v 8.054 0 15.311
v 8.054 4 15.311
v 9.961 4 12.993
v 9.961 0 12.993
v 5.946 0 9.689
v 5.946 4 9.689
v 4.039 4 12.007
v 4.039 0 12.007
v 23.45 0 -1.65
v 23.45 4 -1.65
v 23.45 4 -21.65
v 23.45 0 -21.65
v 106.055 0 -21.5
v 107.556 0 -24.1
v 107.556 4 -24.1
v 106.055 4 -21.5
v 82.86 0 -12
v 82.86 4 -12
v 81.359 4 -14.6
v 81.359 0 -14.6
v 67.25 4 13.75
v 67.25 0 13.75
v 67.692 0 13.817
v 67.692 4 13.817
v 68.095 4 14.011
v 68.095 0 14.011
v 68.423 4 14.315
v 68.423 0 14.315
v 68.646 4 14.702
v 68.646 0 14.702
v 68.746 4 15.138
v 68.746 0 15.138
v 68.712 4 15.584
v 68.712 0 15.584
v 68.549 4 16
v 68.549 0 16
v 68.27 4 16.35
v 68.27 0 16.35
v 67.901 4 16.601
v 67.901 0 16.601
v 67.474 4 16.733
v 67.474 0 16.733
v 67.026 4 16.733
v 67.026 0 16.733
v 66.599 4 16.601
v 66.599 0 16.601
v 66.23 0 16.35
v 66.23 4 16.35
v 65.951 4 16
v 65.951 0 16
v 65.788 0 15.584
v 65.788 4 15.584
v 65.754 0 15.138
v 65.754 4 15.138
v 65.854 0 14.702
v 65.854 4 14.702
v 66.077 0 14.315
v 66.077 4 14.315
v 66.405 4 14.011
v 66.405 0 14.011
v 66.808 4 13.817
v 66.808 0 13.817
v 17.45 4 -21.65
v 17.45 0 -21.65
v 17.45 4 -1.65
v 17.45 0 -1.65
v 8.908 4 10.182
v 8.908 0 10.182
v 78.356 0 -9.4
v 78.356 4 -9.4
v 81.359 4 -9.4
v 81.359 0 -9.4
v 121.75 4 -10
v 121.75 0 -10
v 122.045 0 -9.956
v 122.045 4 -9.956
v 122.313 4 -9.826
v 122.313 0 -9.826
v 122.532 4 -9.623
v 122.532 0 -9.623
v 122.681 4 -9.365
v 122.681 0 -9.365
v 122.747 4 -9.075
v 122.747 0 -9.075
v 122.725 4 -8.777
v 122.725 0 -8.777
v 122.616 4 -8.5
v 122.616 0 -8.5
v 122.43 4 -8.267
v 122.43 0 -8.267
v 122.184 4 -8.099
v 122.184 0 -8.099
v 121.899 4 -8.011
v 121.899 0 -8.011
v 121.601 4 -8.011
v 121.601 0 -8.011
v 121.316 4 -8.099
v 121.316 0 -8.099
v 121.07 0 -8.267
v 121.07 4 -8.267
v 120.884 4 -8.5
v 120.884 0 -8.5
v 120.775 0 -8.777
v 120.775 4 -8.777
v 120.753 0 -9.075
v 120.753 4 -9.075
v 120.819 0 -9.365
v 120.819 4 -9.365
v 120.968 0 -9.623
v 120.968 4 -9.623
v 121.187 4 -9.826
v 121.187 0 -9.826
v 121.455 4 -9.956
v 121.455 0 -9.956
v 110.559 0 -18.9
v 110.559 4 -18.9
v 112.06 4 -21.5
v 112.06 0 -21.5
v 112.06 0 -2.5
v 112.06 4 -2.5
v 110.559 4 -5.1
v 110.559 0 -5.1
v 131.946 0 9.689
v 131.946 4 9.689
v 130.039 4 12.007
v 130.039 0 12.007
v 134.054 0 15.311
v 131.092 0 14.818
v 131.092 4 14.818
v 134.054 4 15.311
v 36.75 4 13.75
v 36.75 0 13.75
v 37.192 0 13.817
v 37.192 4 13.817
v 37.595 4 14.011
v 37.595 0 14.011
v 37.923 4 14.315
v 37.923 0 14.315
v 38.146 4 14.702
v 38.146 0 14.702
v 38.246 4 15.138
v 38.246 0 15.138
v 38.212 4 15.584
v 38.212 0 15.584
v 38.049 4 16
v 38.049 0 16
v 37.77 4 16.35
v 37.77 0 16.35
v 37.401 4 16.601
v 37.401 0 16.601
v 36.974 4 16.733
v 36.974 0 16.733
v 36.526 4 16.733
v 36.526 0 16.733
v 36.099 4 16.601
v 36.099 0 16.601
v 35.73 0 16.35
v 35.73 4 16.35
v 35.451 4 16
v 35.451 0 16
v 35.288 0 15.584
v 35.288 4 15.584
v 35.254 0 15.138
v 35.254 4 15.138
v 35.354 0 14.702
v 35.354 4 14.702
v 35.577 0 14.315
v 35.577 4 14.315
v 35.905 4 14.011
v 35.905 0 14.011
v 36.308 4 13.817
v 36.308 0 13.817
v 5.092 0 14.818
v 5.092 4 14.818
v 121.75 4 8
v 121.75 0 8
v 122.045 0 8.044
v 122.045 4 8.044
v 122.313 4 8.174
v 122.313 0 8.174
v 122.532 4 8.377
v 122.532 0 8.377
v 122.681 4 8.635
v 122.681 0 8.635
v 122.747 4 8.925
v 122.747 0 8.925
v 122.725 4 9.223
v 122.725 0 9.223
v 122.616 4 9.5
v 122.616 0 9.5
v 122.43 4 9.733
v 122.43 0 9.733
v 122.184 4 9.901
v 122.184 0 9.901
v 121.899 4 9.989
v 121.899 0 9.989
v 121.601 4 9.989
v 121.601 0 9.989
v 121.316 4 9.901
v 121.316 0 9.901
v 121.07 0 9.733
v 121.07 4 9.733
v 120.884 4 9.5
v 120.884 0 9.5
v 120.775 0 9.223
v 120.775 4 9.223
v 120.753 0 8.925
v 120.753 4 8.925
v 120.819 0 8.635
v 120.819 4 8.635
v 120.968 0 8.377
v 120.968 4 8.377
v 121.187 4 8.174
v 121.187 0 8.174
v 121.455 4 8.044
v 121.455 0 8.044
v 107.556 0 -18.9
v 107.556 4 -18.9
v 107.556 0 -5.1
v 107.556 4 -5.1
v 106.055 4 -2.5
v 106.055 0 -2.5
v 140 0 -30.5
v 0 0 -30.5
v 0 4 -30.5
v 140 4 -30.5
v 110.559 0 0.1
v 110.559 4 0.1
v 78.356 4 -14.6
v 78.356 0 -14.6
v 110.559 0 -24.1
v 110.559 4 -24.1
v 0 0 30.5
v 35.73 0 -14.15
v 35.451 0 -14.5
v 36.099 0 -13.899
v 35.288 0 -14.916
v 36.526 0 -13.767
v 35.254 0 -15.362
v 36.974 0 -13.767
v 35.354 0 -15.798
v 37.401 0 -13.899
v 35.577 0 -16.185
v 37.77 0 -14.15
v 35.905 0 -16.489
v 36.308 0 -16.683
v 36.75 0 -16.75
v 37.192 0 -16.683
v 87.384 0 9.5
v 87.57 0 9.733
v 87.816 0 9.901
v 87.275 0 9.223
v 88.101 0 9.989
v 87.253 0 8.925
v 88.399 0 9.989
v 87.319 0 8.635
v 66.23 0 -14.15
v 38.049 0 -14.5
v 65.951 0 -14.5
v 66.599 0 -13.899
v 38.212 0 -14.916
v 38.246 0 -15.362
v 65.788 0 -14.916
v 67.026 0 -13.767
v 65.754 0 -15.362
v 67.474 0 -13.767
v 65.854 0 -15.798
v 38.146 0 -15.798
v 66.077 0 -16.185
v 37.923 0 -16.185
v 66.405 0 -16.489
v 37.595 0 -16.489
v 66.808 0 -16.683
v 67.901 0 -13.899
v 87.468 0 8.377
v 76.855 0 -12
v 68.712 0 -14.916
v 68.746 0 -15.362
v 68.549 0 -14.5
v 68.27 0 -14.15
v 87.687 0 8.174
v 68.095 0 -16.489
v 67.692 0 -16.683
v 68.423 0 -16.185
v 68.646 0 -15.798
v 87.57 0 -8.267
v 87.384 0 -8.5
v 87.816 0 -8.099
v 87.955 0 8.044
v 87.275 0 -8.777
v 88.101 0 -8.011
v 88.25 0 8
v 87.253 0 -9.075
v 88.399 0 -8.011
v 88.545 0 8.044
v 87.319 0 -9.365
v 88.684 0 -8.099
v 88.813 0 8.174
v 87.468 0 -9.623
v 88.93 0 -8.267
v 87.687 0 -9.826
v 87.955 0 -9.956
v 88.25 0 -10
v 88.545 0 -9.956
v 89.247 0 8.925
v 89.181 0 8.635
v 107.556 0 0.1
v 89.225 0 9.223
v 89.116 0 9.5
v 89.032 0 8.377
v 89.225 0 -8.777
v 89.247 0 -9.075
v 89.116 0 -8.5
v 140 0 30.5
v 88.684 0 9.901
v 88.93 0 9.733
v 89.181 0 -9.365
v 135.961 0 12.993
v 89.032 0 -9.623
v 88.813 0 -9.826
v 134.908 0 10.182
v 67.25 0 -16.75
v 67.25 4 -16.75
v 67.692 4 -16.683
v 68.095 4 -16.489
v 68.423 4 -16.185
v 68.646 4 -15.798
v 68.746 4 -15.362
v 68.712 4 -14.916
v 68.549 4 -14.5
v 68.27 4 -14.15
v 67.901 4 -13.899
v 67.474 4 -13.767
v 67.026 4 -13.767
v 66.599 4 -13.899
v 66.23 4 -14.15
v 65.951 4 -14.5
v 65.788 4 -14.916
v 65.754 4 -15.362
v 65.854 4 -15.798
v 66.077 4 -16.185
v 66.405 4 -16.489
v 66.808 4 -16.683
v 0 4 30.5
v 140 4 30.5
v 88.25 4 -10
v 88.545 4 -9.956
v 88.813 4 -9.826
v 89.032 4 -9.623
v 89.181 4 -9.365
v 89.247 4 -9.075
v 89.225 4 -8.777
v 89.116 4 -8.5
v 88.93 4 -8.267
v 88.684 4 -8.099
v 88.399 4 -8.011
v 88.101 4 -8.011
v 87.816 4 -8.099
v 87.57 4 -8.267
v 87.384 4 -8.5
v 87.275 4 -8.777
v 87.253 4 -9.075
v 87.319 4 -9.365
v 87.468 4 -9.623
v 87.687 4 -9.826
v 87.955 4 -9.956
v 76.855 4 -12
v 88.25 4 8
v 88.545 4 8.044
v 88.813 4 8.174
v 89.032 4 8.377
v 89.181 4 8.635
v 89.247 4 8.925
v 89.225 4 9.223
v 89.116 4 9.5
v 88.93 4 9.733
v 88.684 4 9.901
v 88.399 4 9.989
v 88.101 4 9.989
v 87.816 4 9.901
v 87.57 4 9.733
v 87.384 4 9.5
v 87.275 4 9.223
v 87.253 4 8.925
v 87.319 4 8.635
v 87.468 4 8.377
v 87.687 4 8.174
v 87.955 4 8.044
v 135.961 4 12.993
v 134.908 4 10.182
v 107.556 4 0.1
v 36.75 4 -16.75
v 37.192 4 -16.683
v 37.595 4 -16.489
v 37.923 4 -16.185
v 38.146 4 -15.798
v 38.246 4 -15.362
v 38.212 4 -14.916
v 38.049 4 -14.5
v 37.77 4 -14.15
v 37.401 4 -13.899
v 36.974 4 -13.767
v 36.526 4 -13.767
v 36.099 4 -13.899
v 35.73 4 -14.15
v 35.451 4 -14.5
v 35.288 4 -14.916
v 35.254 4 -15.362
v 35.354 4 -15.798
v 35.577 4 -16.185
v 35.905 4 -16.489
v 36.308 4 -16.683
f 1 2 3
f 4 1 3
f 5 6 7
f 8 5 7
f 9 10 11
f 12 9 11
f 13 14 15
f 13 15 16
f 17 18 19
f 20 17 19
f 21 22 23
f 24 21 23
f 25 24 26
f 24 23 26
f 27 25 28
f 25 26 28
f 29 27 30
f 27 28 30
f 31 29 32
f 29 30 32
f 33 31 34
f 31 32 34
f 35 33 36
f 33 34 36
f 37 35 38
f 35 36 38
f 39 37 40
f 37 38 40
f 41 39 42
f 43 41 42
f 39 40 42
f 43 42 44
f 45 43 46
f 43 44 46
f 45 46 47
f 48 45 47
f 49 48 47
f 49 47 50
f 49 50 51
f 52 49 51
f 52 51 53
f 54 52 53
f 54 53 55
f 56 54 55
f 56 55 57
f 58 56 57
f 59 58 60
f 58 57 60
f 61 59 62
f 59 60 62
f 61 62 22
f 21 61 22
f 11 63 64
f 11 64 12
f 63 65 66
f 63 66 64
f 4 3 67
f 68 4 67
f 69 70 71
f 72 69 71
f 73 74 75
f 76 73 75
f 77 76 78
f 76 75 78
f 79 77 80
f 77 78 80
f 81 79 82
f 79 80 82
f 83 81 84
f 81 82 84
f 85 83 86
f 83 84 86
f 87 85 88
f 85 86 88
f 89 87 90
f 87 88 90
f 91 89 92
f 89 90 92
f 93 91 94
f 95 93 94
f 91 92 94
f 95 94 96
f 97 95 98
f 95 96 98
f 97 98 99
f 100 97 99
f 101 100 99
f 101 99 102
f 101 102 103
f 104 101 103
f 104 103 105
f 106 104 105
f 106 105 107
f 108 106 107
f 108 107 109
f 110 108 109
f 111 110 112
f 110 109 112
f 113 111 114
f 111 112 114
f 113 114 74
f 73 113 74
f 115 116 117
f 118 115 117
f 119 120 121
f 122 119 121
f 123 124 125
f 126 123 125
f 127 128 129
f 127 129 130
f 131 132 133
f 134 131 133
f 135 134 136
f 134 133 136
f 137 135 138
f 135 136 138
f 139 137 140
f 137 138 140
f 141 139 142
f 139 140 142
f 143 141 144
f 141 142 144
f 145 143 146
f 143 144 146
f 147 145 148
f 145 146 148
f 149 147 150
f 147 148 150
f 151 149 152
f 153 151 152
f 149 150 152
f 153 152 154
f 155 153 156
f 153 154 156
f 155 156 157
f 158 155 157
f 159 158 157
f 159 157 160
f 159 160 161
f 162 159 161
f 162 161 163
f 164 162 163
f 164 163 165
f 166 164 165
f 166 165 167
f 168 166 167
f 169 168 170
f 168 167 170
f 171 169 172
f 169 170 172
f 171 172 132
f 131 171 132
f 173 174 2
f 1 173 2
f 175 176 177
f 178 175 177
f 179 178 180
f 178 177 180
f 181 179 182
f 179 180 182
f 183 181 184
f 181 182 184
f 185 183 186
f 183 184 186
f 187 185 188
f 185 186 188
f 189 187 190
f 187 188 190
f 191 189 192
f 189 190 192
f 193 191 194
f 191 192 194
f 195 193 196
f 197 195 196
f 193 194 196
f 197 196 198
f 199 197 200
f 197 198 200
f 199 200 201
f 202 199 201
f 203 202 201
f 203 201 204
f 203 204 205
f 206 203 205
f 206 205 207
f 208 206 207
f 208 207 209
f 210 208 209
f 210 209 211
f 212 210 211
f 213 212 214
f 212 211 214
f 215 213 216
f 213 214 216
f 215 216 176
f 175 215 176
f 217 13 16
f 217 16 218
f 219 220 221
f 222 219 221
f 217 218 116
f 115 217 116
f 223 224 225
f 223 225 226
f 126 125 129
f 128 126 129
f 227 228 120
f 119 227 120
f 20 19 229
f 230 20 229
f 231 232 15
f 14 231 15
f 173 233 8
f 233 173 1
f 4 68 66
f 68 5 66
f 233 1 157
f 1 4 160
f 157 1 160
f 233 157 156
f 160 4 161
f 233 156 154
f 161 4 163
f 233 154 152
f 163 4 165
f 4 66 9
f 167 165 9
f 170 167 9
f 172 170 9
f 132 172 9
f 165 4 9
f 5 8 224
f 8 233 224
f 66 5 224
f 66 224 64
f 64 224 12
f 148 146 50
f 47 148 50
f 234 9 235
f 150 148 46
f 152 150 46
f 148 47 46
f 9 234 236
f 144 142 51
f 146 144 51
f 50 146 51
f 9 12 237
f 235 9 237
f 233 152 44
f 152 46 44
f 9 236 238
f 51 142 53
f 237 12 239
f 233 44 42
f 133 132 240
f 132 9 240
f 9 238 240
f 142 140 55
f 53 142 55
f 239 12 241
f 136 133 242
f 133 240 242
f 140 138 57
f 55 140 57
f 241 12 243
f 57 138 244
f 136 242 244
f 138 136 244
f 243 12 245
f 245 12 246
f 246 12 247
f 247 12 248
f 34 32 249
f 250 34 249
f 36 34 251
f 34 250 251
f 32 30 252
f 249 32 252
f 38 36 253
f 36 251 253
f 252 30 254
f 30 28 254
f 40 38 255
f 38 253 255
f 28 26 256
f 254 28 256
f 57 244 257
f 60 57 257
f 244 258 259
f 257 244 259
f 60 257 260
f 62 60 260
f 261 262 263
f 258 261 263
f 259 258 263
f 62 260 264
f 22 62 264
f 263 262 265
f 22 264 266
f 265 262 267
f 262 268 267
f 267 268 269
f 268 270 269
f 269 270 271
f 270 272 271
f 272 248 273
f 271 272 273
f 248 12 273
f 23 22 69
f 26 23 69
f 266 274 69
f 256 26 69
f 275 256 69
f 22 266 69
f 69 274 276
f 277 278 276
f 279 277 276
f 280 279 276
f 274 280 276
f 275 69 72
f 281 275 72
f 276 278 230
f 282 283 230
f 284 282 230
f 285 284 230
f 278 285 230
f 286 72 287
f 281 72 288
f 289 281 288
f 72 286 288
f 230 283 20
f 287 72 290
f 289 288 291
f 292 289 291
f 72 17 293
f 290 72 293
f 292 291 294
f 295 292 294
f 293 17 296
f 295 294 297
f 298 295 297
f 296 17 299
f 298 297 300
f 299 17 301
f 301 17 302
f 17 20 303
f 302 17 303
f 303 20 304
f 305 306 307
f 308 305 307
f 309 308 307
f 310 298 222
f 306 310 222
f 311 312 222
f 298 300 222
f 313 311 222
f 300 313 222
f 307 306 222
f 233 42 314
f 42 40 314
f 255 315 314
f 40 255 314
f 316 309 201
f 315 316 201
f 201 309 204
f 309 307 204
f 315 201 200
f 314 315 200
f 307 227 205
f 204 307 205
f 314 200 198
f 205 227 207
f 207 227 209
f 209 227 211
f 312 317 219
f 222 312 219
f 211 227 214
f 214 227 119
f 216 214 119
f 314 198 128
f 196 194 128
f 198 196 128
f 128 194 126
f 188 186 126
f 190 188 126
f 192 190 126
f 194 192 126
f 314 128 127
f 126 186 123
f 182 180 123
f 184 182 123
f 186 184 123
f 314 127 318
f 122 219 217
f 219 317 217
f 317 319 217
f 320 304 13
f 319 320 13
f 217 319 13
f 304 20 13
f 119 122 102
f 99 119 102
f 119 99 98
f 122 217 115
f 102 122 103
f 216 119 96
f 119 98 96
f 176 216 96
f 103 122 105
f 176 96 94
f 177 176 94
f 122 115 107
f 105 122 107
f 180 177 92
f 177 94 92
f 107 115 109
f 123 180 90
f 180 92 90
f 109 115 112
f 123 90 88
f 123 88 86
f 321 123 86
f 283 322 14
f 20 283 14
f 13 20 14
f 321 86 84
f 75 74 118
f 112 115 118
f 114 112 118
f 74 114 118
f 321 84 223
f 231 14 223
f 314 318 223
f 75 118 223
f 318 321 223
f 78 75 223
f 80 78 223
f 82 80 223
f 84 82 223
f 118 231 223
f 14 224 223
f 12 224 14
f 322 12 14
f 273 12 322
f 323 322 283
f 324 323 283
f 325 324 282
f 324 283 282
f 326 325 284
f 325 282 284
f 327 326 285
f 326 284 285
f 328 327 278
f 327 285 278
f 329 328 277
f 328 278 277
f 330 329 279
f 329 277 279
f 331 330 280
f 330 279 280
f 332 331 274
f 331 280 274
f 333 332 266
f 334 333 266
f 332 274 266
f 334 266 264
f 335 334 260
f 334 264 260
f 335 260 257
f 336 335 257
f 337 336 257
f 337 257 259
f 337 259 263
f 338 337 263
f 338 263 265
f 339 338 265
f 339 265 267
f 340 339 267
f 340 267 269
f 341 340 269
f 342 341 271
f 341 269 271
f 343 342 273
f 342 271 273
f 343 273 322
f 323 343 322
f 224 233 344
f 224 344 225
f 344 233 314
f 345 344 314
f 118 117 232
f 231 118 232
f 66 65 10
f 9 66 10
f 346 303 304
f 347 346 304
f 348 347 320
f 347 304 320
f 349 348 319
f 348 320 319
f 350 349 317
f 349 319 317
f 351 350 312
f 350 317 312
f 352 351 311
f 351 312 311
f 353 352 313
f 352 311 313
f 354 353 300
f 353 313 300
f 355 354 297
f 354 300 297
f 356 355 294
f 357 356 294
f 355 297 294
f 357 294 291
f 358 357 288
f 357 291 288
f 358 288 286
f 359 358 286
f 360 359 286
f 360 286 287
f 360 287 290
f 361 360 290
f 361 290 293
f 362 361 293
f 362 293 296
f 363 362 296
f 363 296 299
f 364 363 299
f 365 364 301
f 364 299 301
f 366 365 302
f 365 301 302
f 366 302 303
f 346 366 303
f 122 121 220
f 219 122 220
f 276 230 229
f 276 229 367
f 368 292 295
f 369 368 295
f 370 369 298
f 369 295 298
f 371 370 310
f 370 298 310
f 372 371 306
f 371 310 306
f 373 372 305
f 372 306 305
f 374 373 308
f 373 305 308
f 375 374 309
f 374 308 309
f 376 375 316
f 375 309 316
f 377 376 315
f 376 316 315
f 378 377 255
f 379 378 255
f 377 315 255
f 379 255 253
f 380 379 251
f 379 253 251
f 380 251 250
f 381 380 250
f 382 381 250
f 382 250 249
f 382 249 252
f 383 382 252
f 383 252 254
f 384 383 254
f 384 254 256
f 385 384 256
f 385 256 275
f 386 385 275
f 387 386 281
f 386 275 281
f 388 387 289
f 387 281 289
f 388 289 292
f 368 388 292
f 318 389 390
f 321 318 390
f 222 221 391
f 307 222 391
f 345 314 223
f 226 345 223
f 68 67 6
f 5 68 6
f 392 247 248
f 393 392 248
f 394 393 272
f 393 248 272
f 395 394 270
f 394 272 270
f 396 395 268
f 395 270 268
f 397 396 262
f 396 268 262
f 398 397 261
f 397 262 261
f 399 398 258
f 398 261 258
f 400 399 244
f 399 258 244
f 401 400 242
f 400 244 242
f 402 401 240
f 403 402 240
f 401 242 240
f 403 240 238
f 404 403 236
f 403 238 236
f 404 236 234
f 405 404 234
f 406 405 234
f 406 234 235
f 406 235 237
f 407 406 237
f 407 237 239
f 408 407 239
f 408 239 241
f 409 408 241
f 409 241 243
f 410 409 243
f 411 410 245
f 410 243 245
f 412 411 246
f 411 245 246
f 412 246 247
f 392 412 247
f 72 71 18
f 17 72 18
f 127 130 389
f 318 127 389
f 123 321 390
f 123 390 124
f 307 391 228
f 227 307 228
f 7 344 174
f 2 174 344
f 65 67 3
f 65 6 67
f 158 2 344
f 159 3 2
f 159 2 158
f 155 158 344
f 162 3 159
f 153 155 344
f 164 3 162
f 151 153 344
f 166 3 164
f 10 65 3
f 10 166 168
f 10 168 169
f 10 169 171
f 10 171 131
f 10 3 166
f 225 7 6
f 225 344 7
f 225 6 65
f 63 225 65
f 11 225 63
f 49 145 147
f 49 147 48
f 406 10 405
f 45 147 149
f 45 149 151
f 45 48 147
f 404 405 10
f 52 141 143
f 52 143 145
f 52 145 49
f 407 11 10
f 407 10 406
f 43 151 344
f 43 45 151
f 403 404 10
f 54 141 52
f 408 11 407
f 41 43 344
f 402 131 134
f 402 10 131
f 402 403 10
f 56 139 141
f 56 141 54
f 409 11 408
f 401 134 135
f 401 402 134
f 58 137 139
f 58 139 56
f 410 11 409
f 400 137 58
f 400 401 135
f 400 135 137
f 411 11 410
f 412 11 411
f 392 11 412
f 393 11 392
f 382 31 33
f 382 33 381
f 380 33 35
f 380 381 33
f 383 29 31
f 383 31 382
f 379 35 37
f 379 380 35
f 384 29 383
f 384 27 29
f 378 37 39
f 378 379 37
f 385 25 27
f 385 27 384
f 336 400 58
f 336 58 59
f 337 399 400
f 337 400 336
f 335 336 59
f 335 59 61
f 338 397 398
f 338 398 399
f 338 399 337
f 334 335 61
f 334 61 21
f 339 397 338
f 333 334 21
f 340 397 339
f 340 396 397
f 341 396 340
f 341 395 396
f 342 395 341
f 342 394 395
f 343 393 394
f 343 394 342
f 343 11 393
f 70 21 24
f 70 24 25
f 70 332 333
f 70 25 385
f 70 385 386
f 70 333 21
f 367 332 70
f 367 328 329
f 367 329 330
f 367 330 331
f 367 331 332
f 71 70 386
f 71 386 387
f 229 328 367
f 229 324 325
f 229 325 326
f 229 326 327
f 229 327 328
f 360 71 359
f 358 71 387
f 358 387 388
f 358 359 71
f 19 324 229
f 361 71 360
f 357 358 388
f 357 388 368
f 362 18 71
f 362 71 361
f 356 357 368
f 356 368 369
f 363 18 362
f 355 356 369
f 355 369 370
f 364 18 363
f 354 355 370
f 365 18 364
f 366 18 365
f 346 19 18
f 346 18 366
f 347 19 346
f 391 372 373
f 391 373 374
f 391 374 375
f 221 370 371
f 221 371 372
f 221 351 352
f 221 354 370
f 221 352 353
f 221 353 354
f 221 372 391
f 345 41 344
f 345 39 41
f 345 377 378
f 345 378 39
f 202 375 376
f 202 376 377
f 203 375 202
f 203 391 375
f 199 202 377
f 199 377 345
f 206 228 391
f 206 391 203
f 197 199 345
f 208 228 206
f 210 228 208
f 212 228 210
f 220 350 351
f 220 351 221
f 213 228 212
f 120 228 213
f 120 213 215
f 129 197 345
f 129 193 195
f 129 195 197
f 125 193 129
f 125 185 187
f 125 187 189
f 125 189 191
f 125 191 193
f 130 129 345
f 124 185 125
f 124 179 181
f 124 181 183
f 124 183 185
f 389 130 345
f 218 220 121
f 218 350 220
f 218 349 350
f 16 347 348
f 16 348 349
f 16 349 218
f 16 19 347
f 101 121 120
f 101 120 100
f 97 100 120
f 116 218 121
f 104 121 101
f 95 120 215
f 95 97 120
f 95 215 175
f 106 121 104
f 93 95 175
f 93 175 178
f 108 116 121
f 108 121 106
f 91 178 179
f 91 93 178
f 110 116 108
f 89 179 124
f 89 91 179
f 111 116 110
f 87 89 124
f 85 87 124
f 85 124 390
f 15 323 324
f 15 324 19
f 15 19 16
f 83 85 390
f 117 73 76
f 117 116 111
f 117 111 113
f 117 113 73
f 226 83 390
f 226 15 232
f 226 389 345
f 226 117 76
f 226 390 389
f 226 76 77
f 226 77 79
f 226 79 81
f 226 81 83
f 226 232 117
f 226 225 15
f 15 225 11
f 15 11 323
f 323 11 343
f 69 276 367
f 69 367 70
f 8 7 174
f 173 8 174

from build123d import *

# Parameters (mm, degrees)
SKETCH1_W           = 140
SKETCH1_H           = 61
BOSS_EXTRUDE1_DEPTH = 4
SKETCH2_W           = 6
SKETCH2_H           = 20
CUT_EXTRUDE1_DEPTH  = 10
SKETCH4_3_R         = 1
SKETCH4_3_R_2       = 1.5
CUT_EXTRUDE3_DEPTH  = 4
CUT_EXTRUDE4_DEPTH  = 34
CUT_EXTRUDE5_DEPTH  = 10


with BuildPart() as part:
    # Sketch1 → Boss-Extrude1 (new body)
    with BuildSketch(Plane(origin=(0, 0, 0), x_dir=(1, 0, 0), z_dir=(0, 1, 0))):
        with Locations((70, 0)):
            Rectangle(SKETCH1_W, SKETCH1_H)
    extrude(amount=BOSS_EXTRUDE1_DEPTH)

    # Sketch2 → Cut-Extrude1 (cut)
    with BuildSketch(Plane(origin=(0, 4, 0), x_dir=(1, 0, 0), z_dir=(0, 1, 0))):
        with Locations((20.449723582, 11.650059082)):
            Rectangle(SKETCH2_W, SKETCH2_H)
    extrude(amount=-CUT_EXTRUDE1_DEPTH, mode=Mode.SUBTRACT)

    # Sketch4<3> → Cut-Extrude3 (cut)
    with BuildSketch(Plane.XZ):
        with Locations((88.25, -9)):
            Circle(SKETCH4_3_R)
        with Locations((88.25, 9)):
            Circle(SKETCH4_3_R)
        with Locations((121.75, -9)):
            Circle(SKETCH4_3_R)
        with Locations((121.75, 9)):
            Circle(SKETCH4_3_R)
        with Locations((36.75, 15.25)):
            Circle(SKETCH4_3_R_2)
        with Locations((67.25, 15.25)):
            Circle(SKETCH4_3_R_2)
        with Locations((67.25, -15.25)):
            Circle(SKETCH4_3_R_2)
        with Locations((36.75, -15.25)):
            Circle(SKETCH4_3_R_2)
    extrude(amount=-CUT_EXTRUDE3_DEPTH, mode=Mode.SUBTRACT)

    # Sketch6 → Cut-Extrude4 (cut)
    with BuildSketch(Plane(origin=(0, 4, 0), x_dir=(1, 0, 0), z_dir=(0, 1, 0))):
        Polygon((81.358539738, 14.6), (78.356318338, 14.6), (76.855207639, 12), (78.356318338, 9.4), (81.358539738, 9.4), (82.859650438, 12), align=None)
        Polygon((110.558539738, 5.1), (107.556318338, 5.1), (106.055207639, 2.5), (107.556318338, -0.1), (110.558539738, -0.1), (112.059650438, 2.5), align=None)
        Polygon((112.059650438, 21.5), (110.558539738, 24.1), (107.556318338, 24.1), (106.055207639, 21.5), (107.556318338, 18.9), (110.558539738, 18.9), align=None)
    extrude(amount=-CUT_EXTRUDE4_DEPTH, mode=Mode.SUBTRACT)

    # Sketch7 → Cut-Extrude5 (cut)
    with BuildSketch(Plane(origin=(0, 4, 0), x_dir=(1, 0, 0), z_dir=(0, 1, 0))):
        Polygon((9.961432148, -12.993206821), (8.90784571, -10.181927939), (5.946413563, -9.688721118), (4.038567852, -12.006793179), (5.09215429, -14.818072061), (8.053586437, -15.311278882), align=None)
        Polygon((135.961432148, -12.993206821), (134.90784571, -10.181927939), (131.946413563, -9.688721118), (130.038567852, -12.006793179), (131.09215429, -14.818072061), (134.053586437, -15.311278882), align=None)
    extrude(amount=-CUT_EXTRUDE5_DEPTH, mode=Mode.SUBTRACT)


solid = part.part
